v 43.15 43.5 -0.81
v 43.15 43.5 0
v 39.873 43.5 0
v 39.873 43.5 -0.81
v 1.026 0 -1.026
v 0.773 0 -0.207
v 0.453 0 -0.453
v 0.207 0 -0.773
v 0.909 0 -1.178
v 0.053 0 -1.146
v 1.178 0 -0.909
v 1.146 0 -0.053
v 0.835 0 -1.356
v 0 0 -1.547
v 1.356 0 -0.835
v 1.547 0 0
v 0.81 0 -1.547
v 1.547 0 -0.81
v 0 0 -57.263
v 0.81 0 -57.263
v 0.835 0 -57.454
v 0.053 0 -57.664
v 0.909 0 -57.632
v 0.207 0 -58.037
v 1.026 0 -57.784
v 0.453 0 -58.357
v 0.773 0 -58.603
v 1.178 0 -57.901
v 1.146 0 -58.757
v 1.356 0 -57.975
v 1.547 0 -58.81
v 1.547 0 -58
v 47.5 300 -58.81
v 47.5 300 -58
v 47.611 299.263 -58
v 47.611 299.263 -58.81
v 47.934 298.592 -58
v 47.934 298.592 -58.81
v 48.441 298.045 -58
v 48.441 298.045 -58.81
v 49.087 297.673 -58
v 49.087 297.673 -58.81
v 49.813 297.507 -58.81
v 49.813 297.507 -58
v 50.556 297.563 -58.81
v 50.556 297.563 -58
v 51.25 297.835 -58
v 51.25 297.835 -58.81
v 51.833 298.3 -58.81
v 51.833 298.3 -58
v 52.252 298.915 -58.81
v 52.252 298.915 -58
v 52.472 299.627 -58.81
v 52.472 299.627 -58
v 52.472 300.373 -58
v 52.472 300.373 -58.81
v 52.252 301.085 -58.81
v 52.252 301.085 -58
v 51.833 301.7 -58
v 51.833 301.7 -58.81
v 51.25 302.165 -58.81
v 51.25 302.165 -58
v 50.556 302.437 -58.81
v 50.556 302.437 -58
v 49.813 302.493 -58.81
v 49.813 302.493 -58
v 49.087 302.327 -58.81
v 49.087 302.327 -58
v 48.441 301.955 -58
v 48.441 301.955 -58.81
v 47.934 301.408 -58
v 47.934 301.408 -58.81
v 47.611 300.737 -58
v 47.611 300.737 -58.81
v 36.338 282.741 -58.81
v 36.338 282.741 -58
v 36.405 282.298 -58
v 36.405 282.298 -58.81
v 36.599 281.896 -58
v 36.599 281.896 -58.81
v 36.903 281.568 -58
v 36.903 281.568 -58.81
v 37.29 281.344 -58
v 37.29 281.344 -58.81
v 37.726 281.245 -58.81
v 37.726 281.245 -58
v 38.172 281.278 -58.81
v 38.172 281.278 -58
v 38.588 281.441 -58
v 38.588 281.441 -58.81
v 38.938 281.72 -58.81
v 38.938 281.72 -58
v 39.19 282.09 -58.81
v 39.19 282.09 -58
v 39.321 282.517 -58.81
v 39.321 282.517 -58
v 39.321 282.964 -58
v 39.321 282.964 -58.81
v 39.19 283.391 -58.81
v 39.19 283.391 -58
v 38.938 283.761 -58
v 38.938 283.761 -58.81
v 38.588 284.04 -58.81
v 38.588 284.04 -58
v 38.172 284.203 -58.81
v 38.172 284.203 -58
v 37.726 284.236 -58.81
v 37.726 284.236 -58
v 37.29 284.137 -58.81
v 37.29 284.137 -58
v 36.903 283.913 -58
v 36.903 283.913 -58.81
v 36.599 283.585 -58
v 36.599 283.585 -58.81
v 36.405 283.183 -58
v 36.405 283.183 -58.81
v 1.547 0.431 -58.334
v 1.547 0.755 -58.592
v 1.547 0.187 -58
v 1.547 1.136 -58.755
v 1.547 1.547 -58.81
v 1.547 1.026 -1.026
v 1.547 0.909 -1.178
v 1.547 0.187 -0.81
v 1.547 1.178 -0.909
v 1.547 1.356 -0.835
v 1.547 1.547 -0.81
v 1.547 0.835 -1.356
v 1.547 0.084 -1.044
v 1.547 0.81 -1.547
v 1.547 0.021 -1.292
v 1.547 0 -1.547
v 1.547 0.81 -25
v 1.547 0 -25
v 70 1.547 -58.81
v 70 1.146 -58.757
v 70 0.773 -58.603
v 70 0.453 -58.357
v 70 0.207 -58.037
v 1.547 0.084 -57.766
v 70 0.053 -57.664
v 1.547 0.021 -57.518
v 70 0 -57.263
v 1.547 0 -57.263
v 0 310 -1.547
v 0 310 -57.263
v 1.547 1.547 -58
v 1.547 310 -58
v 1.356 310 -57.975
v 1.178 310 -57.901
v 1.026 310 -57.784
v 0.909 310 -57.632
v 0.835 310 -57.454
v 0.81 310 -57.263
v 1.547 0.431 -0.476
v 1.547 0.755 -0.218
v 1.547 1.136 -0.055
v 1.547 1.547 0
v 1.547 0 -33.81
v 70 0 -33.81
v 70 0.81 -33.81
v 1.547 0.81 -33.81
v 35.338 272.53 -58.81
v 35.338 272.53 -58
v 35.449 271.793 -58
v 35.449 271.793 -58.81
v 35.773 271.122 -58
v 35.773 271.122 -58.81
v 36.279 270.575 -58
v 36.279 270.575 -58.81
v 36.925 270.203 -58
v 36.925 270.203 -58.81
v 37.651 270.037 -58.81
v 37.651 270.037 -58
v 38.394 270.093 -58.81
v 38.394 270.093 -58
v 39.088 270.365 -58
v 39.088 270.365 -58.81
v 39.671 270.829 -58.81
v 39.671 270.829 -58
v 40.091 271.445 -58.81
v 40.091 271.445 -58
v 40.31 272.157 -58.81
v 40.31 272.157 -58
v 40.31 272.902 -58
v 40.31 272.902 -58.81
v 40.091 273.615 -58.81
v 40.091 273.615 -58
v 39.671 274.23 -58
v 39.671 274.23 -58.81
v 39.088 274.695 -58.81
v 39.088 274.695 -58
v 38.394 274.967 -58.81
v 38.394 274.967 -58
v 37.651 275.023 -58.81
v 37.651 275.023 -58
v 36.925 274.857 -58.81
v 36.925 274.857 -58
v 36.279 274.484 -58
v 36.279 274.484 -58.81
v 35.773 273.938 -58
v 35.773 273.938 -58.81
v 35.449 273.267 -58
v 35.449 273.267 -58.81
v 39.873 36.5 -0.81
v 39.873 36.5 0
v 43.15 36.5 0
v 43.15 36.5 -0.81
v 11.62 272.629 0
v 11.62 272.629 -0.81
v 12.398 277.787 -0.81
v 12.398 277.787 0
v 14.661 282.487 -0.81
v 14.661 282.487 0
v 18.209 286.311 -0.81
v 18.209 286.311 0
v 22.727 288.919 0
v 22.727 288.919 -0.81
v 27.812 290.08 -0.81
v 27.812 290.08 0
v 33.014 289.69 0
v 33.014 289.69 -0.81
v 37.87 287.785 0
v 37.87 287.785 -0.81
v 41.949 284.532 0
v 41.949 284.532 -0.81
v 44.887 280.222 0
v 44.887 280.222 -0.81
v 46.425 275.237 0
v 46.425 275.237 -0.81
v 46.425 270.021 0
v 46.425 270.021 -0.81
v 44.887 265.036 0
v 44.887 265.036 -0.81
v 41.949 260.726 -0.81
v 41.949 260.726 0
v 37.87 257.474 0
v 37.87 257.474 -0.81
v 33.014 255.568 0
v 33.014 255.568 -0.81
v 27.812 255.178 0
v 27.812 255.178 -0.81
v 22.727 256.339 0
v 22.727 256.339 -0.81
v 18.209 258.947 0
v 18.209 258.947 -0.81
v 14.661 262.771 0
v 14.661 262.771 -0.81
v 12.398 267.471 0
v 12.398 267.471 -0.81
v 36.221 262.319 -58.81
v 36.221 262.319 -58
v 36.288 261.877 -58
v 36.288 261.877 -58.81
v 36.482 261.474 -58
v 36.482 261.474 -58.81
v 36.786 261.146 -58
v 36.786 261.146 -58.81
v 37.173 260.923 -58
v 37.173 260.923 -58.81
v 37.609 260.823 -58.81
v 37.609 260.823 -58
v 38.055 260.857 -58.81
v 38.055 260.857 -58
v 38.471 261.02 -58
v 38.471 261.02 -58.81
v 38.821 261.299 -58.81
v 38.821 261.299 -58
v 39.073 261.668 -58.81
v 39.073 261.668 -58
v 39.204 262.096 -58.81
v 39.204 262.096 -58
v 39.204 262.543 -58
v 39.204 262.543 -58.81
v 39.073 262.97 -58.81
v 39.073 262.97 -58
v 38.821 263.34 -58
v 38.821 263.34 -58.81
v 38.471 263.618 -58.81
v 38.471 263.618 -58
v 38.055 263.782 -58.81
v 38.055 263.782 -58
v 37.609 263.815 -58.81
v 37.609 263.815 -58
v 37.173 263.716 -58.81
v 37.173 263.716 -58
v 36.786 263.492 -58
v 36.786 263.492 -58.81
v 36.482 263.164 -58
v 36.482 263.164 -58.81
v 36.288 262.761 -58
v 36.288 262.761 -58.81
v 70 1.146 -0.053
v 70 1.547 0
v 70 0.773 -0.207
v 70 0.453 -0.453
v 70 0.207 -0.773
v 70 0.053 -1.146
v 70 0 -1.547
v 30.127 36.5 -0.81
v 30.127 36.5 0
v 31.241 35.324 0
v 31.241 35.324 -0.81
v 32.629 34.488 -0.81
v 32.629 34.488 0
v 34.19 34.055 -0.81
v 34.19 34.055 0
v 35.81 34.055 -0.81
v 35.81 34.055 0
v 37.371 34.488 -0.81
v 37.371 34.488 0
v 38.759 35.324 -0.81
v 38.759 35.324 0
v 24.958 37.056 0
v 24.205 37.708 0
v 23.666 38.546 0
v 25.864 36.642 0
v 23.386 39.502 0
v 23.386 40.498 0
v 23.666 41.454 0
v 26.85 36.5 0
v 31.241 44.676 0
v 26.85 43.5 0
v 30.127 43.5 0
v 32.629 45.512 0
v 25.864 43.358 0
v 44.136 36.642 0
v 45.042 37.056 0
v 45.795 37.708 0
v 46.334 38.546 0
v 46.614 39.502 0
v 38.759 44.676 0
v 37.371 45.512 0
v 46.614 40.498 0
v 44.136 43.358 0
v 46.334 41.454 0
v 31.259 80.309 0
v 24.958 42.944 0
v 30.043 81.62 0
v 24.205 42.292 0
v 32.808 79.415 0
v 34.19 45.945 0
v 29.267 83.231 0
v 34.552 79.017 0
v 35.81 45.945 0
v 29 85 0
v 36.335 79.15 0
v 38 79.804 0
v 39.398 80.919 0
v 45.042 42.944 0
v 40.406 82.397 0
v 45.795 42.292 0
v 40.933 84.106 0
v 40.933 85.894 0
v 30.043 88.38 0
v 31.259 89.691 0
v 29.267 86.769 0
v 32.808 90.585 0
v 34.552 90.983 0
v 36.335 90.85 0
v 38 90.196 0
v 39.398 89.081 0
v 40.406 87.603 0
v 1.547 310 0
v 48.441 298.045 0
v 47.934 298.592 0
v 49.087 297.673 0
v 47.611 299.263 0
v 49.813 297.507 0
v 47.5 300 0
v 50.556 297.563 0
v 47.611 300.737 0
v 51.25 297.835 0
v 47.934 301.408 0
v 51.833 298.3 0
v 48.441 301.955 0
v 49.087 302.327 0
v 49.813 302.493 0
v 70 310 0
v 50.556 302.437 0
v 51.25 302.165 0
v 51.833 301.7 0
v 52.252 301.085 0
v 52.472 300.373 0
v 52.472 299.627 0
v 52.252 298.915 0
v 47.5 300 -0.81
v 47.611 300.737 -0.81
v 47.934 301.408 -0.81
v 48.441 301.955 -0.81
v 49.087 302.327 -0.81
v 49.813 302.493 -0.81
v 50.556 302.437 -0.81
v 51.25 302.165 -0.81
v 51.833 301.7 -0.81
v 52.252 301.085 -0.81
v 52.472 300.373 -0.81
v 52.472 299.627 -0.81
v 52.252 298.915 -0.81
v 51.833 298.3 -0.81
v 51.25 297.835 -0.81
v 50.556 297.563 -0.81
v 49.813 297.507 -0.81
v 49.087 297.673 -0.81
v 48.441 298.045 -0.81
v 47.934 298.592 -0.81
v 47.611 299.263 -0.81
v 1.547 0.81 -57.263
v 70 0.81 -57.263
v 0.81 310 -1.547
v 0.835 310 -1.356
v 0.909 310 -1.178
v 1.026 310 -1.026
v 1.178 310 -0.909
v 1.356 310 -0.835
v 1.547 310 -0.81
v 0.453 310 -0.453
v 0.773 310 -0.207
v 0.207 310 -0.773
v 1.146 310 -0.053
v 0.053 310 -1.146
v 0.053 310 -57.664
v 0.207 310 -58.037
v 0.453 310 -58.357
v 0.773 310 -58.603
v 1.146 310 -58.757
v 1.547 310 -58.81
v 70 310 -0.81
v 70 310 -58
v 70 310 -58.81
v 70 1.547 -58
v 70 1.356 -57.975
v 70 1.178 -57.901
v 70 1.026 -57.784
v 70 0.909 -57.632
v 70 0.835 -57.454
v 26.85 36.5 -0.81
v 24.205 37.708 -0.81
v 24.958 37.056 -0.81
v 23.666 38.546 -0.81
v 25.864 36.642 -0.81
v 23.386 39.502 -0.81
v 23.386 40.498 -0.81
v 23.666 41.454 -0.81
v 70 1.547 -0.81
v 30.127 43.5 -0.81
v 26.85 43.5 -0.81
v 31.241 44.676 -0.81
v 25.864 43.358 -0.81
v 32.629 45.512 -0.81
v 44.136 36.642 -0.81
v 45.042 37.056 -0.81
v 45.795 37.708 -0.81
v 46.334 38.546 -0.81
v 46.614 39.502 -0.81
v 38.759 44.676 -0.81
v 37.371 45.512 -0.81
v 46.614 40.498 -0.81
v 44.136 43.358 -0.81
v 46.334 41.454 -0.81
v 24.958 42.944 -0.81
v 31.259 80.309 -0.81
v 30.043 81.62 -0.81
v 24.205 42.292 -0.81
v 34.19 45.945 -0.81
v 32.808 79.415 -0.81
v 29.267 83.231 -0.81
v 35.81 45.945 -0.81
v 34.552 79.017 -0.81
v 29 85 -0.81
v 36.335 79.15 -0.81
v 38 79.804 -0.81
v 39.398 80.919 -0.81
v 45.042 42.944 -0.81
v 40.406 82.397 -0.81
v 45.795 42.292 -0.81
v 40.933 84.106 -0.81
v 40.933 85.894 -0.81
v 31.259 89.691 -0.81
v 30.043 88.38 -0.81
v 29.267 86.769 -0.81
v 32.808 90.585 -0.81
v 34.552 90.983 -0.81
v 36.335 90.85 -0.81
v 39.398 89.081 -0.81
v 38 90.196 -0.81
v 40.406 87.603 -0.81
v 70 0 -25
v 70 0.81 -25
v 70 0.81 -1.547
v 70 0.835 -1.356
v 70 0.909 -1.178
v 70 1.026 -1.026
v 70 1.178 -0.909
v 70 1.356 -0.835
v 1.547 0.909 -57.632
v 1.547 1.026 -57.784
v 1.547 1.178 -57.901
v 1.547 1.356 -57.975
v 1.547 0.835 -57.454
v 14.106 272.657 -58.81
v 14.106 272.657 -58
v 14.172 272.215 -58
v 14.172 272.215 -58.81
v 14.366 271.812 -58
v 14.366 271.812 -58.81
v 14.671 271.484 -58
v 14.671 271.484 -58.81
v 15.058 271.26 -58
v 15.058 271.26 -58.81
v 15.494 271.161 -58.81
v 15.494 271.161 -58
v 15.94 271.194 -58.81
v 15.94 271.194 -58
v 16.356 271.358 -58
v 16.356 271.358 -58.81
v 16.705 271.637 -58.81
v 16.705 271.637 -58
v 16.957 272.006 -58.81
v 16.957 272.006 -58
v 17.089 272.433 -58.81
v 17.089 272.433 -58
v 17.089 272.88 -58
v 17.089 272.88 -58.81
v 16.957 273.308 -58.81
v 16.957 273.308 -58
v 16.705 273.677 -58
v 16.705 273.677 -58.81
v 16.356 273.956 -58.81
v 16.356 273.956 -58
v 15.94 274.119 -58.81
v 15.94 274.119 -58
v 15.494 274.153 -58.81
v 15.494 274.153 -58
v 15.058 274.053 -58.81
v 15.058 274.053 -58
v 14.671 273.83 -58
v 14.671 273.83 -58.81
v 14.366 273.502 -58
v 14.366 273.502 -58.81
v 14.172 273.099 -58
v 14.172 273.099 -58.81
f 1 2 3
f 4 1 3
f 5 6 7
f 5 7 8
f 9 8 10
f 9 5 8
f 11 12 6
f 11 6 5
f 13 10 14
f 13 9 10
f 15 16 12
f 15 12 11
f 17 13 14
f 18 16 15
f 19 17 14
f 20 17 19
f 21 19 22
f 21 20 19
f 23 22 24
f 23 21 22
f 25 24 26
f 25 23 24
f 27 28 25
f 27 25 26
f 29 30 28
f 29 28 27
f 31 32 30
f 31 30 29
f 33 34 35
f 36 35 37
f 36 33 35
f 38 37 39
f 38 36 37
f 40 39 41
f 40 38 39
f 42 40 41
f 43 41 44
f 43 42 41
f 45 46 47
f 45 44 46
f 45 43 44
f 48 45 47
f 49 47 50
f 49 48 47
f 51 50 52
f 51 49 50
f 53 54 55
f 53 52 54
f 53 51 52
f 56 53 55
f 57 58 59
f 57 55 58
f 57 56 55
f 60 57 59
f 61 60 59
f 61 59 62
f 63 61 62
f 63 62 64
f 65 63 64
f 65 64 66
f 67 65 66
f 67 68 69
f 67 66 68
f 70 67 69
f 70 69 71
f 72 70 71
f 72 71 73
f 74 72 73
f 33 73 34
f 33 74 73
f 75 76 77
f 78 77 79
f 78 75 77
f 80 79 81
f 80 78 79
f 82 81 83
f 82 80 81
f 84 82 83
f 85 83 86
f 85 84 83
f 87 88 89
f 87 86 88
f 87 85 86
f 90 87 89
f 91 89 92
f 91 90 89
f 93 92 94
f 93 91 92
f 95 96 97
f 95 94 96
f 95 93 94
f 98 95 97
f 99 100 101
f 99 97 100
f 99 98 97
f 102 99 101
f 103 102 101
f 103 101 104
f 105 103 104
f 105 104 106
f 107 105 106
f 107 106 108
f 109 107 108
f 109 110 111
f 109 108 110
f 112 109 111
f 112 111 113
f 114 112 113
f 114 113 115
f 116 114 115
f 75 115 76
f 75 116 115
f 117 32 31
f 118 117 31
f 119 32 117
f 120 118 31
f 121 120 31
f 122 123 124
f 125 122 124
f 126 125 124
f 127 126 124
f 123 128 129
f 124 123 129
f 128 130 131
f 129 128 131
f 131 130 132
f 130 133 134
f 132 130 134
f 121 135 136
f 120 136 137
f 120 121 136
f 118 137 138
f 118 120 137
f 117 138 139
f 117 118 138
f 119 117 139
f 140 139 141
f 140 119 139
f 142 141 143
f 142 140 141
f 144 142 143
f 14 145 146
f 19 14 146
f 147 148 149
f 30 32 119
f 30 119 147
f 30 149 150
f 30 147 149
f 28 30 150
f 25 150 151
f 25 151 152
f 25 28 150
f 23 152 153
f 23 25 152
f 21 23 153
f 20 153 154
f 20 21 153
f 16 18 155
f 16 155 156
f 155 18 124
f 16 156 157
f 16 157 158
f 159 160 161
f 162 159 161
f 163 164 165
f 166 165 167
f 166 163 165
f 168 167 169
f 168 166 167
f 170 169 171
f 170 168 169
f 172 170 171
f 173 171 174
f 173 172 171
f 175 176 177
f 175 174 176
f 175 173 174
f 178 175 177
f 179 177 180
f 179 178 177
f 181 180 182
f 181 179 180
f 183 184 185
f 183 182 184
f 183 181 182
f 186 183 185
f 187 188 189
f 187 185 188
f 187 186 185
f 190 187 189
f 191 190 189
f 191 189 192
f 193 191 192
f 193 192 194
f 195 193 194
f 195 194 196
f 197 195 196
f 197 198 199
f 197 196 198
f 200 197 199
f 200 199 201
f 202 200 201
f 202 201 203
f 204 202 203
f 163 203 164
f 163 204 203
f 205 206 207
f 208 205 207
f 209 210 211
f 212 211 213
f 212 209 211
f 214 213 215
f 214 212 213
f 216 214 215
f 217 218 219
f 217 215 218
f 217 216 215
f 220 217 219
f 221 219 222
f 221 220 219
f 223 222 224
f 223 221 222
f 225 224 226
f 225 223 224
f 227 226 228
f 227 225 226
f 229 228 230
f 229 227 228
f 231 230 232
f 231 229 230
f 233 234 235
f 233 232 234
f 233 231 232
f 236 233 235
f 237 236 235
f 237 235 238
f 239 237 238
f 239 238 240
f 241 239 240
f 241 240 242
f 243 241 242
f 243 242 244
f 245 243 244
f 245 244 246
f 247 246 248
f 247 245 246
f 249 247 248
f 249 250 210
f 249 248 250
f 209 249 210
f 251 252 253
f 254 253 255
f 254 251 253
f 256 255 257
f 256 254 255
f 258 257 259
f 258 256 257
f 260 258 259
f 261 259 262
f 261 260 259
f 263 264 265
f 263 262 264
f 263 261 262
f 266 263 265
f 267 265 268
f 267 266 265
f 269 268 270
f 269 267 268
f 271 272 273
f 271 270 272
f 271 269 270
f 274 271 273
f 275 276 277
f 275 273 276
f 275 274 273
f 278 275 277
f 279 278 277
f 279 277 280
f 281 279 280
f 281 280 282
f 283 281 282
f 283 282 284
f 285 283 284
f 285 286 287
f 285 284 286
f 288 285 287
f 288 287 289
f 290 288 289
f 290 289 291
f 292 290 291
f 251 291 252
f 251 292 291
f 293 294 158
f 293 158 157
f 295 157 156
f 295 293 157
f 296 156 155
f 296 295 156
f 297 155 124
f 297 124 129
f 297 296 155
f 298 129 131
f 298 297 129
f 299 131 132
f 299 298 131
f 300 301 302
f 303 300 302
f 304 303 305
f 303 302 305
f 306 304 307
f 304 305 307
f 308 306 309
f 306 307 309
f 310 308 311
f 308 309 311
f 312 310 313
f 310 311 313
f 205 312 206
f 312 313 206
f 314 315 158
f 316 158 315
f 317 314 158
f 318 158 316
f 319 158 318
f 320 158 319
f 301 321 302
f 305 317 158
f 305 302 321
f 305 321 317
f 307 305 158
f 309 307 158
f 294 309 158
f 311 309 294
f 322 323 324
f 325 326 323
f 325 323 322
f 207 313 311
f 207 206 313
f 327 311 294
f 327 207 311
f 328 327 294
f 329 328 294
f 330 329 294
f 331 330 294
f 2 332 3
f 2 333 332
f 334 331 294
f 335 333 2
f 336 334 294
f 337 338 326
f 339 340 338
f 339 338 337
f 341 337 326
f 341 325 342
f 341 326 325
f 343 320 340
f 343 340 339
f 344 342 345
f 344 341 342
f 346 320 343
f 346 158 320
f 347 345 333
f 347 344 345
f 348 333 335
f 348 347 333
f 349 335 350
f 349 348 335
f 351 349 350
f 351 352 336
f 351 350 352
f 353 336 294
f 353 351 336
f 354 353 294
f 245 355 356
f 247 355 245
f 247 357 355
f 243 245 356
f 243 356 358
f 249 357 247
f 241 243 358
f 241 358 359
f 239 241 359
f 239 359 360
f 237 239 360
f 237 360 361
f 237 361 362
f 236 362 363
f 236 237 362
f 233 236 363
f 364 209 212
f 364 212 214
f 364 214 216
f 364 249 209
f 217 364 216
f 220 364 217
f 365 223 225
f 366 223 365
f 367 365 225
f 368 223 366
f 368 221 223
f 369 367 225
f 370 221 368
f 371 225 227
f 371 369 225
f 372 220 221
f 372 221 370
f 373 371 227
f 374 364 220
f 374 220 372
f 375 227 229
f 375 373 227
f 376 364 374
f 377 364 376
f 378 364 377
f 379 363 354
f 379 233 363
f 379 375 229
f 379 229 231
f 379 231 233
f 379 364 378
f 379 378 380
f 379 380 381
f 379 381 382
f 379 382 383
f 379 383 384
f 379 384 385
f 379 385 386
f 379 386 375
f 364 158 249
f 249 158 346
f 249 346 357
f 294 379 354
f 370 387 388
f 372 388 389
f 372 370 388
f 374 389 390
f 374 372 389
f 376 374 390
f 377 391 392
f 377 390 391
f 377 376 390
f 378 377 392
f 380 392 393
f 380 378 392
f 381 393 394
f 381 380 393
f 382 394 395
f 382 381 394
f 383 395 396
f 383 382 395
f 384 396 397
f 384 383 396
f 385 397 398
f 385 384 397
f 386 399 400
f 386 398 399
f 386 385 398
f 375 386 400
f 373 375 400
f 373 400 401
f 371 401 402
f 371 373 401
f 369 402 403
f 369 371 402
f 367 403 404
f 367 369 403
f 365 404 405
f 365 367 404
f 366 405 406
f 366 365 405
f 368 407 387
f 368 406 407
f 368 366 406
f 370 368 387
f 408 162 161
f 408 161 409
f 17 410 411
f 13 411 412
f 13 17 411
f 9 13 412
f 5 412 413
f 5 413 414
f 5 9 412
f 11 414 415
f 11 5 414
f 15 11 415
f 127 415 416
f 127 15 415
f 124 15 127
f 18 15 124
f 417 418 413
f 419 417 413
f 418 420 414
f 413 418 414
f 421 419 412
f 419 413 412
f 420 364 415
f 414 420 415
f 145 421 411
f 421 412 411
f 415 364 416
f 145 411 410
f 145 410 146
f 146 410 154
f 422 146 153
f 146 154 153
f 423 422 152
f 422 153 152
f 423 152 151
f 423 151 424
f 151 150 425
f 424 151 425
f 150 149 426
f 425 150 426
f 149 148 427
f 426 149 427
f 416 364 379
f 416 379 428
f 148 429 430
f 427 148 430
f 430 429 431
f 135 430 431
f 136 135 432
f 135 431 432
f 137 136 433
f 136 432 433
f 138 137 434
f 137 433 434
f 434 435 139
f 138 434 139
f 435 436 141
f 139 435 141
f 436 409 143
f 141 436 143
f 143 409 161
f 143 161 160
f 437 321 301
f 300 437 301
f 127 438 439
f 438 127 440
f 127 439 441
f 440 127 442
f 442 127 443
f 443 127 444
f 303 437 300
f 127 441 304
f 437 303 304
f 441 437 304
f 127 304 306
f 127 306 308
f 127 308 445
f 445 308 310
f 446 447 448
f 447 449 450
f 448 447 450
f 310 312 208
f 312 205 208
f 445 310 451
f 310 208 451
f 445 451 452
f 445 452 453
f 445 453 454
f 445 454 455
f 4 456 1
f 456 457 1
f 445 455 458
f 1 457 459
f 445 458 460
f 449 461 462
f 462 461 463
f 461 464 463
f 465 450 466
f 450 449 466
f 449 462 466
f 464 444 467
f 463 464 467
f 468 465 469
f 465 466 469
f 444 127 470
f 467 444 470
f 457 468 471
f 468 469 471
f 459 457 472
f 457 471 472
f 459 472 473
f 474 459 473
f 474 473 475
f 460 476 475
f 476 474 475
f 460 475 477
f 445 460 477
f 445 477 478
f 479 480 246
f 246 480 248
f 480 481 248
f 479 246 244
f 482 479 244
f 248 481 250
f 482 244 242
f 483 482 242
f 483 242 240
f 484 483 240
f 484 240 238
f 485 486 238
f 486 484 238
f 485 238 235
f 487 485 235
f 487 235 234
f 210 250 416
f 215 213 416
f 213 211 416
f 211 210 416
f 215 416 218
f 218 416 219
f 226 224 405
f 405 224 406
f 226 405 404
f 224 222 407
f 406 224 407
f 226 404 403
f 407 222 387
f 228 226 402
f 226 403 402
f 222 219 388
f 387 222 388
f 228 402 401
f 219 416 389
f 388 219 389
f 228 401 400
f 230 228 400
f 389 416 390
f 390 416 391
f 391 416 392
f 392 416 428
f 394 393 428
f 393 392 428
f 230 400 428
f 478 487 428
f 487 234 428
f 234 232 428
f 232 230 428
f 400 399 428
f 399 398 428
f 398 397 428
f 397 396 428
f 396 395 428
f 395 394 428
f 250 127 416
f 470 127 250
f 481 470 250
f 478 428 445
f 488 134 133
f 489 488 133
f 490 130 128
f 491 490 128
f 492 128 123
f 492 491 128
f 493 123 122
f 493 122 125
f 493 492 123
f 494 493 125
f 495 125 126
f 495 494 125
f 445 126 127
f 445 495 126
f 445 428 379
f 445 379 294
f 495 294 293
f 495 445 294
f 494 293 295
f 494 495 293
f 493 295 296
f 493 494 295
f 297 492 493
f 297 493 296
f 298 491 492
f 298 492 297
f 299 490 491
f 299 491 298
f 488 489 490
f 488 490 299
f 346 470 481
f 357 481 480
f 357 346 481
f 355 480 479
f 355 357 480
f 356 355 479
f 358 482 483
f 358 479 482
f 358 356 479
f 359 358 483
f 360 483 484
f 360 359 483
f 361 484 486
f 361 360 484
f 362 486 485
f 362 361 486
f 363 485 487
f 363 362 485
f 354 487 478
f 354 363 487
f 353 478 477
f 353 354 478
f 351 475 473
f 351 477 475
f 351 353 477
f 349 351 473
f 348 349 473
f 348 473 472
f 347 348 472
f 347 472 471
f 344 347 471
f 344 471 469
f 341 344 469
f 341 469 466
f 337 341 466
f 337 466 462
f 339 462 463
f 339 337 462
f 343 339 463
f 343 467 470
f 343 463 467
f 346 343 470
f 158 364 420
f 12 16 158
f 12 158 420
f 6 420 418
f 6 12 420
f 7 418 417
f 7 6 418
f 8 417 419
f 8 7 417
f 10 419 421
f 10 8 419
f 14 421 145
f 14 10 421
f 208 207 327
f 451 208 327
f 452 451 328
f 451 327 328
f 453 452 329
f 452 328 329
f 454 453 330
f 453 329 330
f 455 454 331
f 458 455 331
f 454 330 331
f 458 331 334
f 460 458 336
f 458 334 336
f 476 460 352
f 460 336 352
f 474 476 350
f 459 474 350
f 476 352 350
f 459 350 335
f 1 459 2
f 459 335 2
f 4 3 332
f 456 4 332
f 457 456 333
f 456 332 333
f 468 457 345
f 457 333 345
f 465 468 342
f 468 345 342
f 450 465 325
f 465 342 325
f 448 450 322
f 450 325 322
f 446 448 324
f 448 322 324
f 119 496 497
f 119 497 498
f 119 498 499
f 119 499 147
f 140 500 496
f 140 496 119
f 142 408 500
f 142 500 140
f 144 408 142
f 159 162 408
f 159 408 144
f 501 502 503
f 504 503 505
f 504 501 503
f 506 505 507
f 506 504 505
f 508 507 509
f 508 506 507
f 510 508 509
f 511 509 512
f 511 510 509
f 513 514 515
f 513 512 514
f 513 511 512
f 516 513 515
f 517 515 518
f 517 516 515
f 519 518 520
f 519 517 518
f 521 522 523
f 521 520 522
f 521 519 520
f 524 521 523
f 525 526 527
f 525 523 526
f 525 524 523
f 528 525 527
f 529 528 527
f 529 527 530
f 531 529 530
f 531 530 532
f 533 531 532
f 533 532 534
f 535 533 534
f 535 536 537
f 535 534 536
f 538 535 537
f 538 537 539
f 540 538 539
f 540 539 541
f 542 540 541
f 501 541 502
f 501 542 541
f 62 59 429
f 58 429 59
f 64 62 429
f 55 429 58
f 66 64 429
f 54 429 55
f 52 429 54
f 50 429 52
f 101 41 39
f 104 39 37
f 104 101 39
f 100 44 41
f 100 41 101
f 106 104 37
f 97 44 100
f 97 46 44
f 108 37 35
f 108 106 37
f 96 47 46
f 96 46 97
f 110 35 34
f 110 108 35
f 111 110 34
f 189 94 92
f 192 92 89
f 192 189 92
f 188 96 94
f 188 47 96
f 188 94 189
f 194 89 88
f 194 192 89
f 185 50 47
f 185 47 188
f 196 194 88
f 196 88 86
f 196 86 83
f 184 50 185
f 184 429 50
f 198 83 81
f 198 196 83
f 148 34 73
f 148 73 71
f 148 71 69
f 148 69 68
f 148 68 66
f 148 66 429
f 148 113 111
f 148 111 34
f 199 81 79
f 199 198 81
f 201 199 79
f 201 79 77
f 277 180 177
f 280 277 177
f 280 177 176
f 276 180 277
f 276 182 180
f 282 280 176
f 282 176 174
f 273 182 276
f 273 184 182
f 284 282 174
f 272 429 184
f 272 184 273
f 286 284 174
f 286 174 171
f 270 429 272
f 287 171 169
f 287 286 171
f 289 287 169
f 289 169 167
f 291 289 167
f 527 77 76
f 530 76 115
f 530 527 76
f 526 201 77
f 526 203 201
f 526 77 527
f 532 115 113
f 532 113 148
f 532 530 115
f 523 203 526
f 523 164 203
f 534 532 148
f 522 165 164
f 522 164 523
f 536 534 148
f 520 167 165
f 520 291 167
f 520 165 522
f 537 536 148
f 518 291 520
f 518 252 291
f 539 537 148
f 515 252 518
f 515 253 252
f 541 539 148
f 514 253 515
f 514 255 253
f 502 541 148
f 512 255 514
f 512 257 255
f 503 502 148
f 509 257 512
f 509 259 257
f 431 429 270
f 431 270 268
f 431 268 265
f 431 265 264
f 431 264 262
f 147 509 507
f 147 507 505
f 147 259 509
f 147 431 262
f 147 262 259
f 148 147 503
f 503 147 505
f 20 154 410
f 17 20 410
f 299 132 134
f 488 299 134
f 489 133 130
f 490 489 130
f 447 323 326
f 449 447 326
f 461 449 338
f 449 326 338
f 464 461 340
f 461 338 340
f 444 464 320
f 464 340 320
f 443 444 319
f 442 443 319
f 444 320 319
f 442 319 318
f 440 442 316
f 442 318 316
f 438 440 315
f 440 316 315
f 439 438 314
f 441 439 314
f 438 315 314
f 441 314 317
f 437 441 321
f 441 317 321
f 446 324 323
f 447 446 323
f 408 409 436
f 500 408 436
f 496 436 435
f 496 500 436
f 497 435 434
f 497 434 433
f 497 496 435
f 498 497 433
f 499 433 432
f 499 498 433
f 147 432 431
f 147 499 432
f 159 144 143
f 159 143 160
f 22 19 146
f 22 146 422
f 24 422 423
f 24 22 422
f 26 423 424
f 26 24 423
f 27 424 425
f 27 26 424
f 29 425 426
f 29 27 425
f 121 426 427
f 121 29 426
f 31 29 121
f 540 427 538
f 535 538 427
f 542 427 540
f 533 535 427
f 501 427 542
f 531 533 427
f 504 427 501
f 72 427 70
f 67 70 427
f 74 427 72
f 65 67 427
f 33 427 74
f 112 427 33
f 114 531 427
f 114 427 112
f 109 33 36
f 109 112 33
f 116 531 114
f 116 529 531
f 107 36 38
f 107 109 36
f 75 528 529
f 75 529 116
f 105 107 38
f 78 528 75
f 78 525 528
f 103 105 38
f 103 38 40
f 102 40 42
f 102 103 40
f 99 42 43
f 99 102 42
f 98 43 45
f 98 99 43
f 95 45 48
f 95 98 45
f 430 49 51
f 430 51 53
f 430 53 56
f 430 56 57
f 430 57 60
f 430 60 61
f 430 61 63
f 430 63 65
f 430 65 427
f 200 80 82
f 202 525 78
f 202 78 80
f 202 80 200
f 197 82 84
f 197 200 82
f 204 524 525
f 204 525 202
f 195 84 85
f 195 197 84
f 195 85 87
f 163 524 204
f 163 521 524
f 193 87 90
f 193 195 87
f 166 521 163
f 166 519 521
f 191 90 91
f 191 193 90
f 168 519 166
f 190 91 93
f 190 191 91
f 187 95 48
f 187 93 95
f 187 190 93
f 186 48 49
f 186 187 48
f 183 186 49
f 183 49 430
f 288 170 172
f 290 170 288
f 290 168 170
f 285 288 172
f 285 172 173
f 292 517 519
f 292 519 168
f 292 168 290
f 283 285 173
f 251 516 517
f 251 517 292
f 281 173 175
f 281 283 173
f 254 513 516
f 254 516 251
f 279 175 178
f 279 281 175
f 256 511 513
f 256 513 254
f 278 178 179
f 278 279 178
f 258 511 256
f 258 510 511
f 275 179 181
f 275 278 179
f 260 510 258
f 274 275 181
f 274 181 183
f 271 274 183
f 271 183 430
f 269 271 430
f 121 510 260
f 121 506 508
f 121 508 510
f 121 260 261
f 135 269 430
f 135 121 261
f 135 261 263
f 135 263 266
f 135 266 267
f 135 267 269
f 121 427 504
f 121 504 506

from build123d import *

# Parameters (mm, degrees)
SKETCH1_W                      = 70
SKETCH1_H                      = 310
BASE_FLANGE1_DEPTH             = 0.81
EDGE_FLANGE1_STRIP_W           = 4.7132
EDGE_FLANGE1_STRIP_H           = 0.81
EDGE_FLANGE1_STRIP_CUT_DEPTH   = 310
EDGE_FLANGE1_DEPTH             = 310
EDGE_FLANGE2_STRIP_W           = 4.7132
EDGE_FLANGE2_STRIP_H           = 0.81
EDGE_FLANGE2_STRIP_CUT_DEPTH   = 310
EDGE_FLANGE2_DEPTH             = 310
EDGE_FLANGE3_STRIP_W           = 4.7132
EDGE_FLANGE3_STRIP_H           = 0.81
EDGE_FLANGE3_STRIP_CUT_DEPTH   = 68.4534
EDGE_FLANGE3_STRIP_2_W         = 4.7132
EDGE_FLANGE3_STRIP_2_H         = 0.81
EDGE_FLANGE3_STRIP_CUT_2_DEPTH = 68.4534
EDGE_FLANGE3_DEPTH             = 68.4534
EDGE_FLANGE3_BEND_DEPTH        = 68.4534
CUT_EXTRUDE2_REACH             = 325.201
SKETCH18_R                     = 2.5
SKETCH18_R_2                   = 1.5
CUT_EXTRUDE1_REACH             = 325.201
SKETCH17_R                     = 17.5
SKETCH17_R_2                   = 2.5
SKETCH17_R_3                   = 6


# Sheet-metal steps are written as plain solids
with BuildPart() as part:
    # Sketch1 → Base-Flange1 (new body)
    with BuildSketch(Plane.XY):
        with Locations((35, 155)):
            Rectangle(SKETCH1_W, SKETCH1_H)
    extrude(amount=-BASE_FLANGE1_DEPTH)

    # Edge-Flange1 strip (across the edge) → Edge-Flange1 strip cut (cut)
    with BuildSketch(Plane(origin=(0, 0, -0.81), x_dir=(1, 0, 0), z_dir=(0, 1, 0))):
        with Locations((-0.81, -0.405)):
            Rectangle(EDGE_FLANGE1_STRIP_W, EDGE_FLANGE1_STRIP_H)
    extrude(amount=EDGE_FLANGE1_STRIP_CUT_DEPTH, mode=Mode.SUBTRACT)

    # Edge-Flange1 section (across the edge) → Edge-Flange1 (add)
    with BuildSketch(Plane(origin=(0, 0, -0.81), x_dir=(1, 0, 0), z_dir=(0, 1, 0))):
        with BuildLine():
            Line((0, 0.7366), (0, 58))
            Line((0, 58), (0.81, 58))
            Line((0.81, 58), (0.81, 0.7366))
            ThreePointArc((0.81, 0.7366), (1.025745145, 0.215745145), (1.5466, 0))
            Line((1.5466, 0), (1.5466, -0.81))
            ThreePointArc((1.5466, -0.81), (0.452988652, -0.357011348), (0, 0.7366))
        make_face()
    extrude(amount=EDGE_FLANGE1_DEPTH)

    # Edge-Flange2 strip (across the edge) → Edge-Flange2 strip cut (cut)
    with BuildSketch(Plane(origin=(0.81, 0, -58.81), x_dir=(0, 0, 1), z_dir=(0, 1, 0))):
        with Locations((-0.81, -0.405)):
            Rectangle(EDGE_FLANGE2_STRIP_W, EDGE_FLANGE2_STRIP_H)
    extrude(amount=EDGE_FLANGE2_STRIP_CUT_DEPTH, mode=Mode.SUBTRACT)

    # Edge-Flange2 section (across the edge) → Edge-Flange2 (add)
    with BuildSketch(Plane(origin=(0.81, 0, -58.81), x_dir=(0, 0, 1), z_dir=(0, 1, 0))):
        with BuildLine():
            Line((0, 0.7366), (0, 69.19))
            Line((0, 69.19), (0.81, 69.19))
            Line((0.81, 69.19), (0.81, 0.7366))
            ThreePointArc((0.81, 0.7366), (1.025745145, 0.215745145), (1.5466, 0))
            Line((1.5466, 0), (1.5466, -0.81))
            ThreePointArc((1.5466, -0.81), (0.452988652, -0.357011348), (0, 0.7366))
        make_face()
    extrude(amount=EDGE_FLANGE2_DEPTH)

    # Edge-Flange3 strip (across the edge) → Edge-Flange3 strip cut (cut)
    with BuildSketch(Plane(origin=(70, 0, -0.81), x_dir=(0, 1, 0), z_dir=(-1, 0, 0))):
        with Locations((-0.81, -0.405)):
            Rectangle(EDGE_FLANGE3_STRIP_W, EDGE_FLANGE3_STRIP_H)
    extrude(amount=EDGE_FLANGE3_STRIP_CUT_DEPTH, mode=Mode.SUBTRACT)

    # Edge-Flange3 strip 2 (across the edge) → Edge-Flange3 strip cut 2 (cut)
    with BuildSketch(Plane(origin=(1.5466, 0, -58), x_dir=(0, 1, 0), z_dir=(1, 0, 0))):
        with Locations((-0.81, -0.405)):
            Rectangle(EDGE_FLANGE3_STRIP_2_W, EDGE_FLANGE3_STRIP_2_H)
    extrude(amount=EDGE_FLANGE3_STRIP_CUT_2_DEPTH, mode=Mode.SUBTRACT)

    # Edge-Flange3 section (across the edge) → Edge-Flange3 (add)
    with BuildSketch(Plane(origin=(70, 0, -0.81), x_dir=(0, 1, 0), z_dir=(-1, 0, 0))):
        with BuildLine():
            Line((0, 0.7366), (0, 24.19))
            Line((0, 24.19), (0.81, 24.19))
            Line((0.81, 24.19), (0.81, 0.7366))
            ThreePointArc((0.81, 0.7366), (1.025745145, 0.215745145), (1.5466, 0))
            Line((1.5466, 0), (1.5466, -0.81))
            ThreePointArc((1.5466, -0.81), (0.452988652, -0.357011348), (0, 0.7366))
        make_face()
    extrude(amount=EDGE_FLANGE3_DEPTH)

    # Edge-Flange3 section 2 (across the edge) → Edge-Flange3 bend (add)
    with BuildSketch(Plane(origin=(1.5466, 0, -58), x_dir=(0, 1, 0), z_dir=(1, 0, 0))):
        with BuildLine():
            Line((0, 0.7366), (0, 24.19))
            Line((0, 24.19), (0.81, 24.19))
            Line((0.81, 24.19), (0.81, 0.7366))
            ThreePointArc((0.81, 0.7366), (1.025745145, 0.215745145), (1.5466, 0))
            Line((1.5466, 0), (1.5466, -0.81))
            ThreePointArc((1.5466, -0.81), (0.452988652, -0.357011348), (0, 0.7366))
        make_face()
    extrude(amount=EDGE_FLANGE3_BEND_DEPTH)

    # Sketch18 → Cut-Extrude2 (cut, up to next)
    with BuildSketch(Plane.XY.offset(-58.81), mode=Mode.PRIVATE) as cut_extrude2_sk1:
        with Locations(Location((37.83811715, 272.529876457, 0), (0, 0, 180))):
            Circle(SKETCH18_R)
    cut_extrude2_tool1 = extrude(cut_extrude2_sk1.sketch, amount=CUT_EXTRUDE2_REACH, mode=Mode.PRIVATE) & part.part
    # Sketch18 → Cut-Extrude2 (cut, up to next)
    with BuildSketch(Plane.XY.offset(-58.81), mode=Mode.PRIVATE) as cut_extrude2_sk2:
        with Locations(Location((50, 300, 0), (0, 0, 180))):
            Circle(SKETCH18_R)
    cut_extrude2_tool2 = extrude(cut_extrude2_sk2.sketch, amount=CUT_EXTRUDE2_REACH, mode=Mode.PRIVATE) & part.part
    # Sketch18 → Cut-Extrude2 (cut, up to next)
    with BuildSketch(Plane.XY.offset(-58.81), mode=Mode.PRIVATE) as cut_extrude2_sk3:
        with Locations(Location((37.721227194, 262.319243723, 0), (0, 0, 180))):
            Circle(SKETCH18_R_2)
    cut_extrude2_tool3 = extrude(cut_extrude2_sk3.sketch, amount=CUT_EXTRUDE2_REACH, mode=Mode.PRIVATE) & part.part
    # Sketch18 → Cut-Extrude2 (cut, up to next)
    with BuildSketch(Plane.XY.offset(-58.81), mode=Mode.PRIVATE) as cut_extrude2_sk4:
        with Locations(Location((37.83811715, 282.740509191, 0), (0, 0, 180))):
            Circle(SKETCH18_R_2)
    cut_extrude2_tool4 = extrude(cut_extrude2_sk4.sketch, amount=CUT_EXTRUDE2_REACH, mode=Mode.PRIVATE) & part.part
    # Sketch18 → Cut-Extrude2 (cut, up to next)
    with BuildSketch(Plane.XY.offset(-58.81), mode=Mode.PRIVATE) as cut_extrude2_sk5:
        with Locations(Location((15.605835414, 272.656798014, 0), (0, 0, 180))):
            Circle(SKETCH18_R_2)
    cut_extrude2_tool5 = extrude(cut_extrude2_sk5.sketch, amount=CUT_EXTRUDE2_REACH, mode=Mode.PRIVATE) & part.part
    add(cut_extrude2_tool1.solids().sort_by_distance((37.838117, 272.529876, -58.81))[0], mode=Mode.SUBTRACT)
    add(cut_extrude2_tool2.solids().sort_by_distance((50, 300, -58.81))[0], mode=Mode.SUBTRACT)
    add(cut_extrude2_tool3.solids().sort_by_distance((37.721227, 262.319244, -58.81))[0], mode=Mode.SUBTRACT)
    add(cut_extrude2_tool4.solids().sort_by_distance((37.838117, 282.740509, -58.81))[0], mode=Mode.SUBTRACT)
    add(cut_extrude2_tool5.solids().sort_by_distance((15.605835, 272.656798, -58.81))[0], mode=Mode.SUBTRACT)

    # Sketch17 → Cut-Extrude1 (cut, up to next)
    with BuildSketch(Plane(origin=(0, 0, 0), x_dir=(-1, 0, 0), z_dir=(0, 0, -1)), mode=Mode.PRIVATE) as cut_extrude1_sk1:
        with Locations((-29.120132649, 272.629176961)):
            Circle(SKETCH17_R)
    cut_extrude1_tool1 = extrude(cut_extrude1_sk1.sketch, amount=CUT_EXTRUDE1_REACH, mode=Mode.PRIVATE) & part.part
    # Sketch17 → Cut-Extrude1 (cut, up to next)
    with BuildSketch(Plane(origin=(0, 0, 0), x_dir=(-1, 0, 0), z_dir=(0, 0, -1)), mode=Mode.PRIVATE) as cut_extrude1_sk2:
        with Locations((-50, 300)):
            Circle(SKETCH17_R_2)
    cut_extrude1_tool2 = extrude(cut_extrude1_sk2.sketch, amount=CUT_EXTRUDE1_REACH, mode=Mode.PRIVATE) & part.part
    # Sketch17 → Cut-Extrude1 (cut, up to next)
    with BuildSketch(Plane(origin=(0, 0, 0), x_dir=(-1, 0, 0), z_dir=(0, 0, -1)), mode=Mode.PRIVATE) as cut_extrude1_sk3:
        with Locations((-35, 85)):
            Circle(SKETCH17_R_3)
    cut_extrude1_tool3 = extrude(cut_extrude1_sk3.sketch, amount=CUT_EXTRUDE1_REACH, mode=Mode.PRIVATE) & part.part
    # Sketch17 → Cut-Extrude1 (cut, up to next)
    with BuildSketch(Plane(origin=(0, 0, 0), x_dir=(-1, 0, 0), z_dir=(0, 0, -1)), mode=Mode.PRIVATE) as cut_extrude1_sk4:
        with BuildLine():
            Line((-43.15, 43.5), (-39.873397172, 43.5))
            ThreePointArc((-39.873397172, 43.5), (-35, 46), (-30.126602828, 43.5))
            Line((-30.126602828, 43.5), (-26.85, 43.5))
            ThreePointArc((-26.85, 43.5), (-23.35, 40), (-26.85, 36.5))
            Line((-26.85, 36.5), (-30.126602828, 36.5))
            ThreePointArc((-30.126602828, 36.5), (-35, 34), (-39.873397172, 36.5))
            Line((-39.873397172, 36.5), (-43.15, 36.5))
            ThreePointArc((-43.15, 36.5), (-46.65, 40), (-43.15, 43.5))
        make_face()
    cut_extrude1_tool4 = extrude(cut_extrude1_sk4.sketch, amount=CUT_EXTRUDE1_REACH, mode=Mode.PRIVATE) & part.part
    add(cut_extrude1_tool1.solids().sort_by_distance((29.120133, 272.629177, 0))[0], mode=Mode.SUBTRACT)
    add(cut_extrude1_tool2.solids().sort_by_distance((50, 300, 0))[0], mode=Mode.SUBTRACT)
    add(cut_extrude1_tool3.solids().sort_by_distance((35, 85, 0))[0], mode=Mode.SUBTRACT)
    add(cut_extrude1_tool4.solids().sort_by_distance((35, 40, 0))[0], mode=Mode.SUBTRACT)


solid = part.part
